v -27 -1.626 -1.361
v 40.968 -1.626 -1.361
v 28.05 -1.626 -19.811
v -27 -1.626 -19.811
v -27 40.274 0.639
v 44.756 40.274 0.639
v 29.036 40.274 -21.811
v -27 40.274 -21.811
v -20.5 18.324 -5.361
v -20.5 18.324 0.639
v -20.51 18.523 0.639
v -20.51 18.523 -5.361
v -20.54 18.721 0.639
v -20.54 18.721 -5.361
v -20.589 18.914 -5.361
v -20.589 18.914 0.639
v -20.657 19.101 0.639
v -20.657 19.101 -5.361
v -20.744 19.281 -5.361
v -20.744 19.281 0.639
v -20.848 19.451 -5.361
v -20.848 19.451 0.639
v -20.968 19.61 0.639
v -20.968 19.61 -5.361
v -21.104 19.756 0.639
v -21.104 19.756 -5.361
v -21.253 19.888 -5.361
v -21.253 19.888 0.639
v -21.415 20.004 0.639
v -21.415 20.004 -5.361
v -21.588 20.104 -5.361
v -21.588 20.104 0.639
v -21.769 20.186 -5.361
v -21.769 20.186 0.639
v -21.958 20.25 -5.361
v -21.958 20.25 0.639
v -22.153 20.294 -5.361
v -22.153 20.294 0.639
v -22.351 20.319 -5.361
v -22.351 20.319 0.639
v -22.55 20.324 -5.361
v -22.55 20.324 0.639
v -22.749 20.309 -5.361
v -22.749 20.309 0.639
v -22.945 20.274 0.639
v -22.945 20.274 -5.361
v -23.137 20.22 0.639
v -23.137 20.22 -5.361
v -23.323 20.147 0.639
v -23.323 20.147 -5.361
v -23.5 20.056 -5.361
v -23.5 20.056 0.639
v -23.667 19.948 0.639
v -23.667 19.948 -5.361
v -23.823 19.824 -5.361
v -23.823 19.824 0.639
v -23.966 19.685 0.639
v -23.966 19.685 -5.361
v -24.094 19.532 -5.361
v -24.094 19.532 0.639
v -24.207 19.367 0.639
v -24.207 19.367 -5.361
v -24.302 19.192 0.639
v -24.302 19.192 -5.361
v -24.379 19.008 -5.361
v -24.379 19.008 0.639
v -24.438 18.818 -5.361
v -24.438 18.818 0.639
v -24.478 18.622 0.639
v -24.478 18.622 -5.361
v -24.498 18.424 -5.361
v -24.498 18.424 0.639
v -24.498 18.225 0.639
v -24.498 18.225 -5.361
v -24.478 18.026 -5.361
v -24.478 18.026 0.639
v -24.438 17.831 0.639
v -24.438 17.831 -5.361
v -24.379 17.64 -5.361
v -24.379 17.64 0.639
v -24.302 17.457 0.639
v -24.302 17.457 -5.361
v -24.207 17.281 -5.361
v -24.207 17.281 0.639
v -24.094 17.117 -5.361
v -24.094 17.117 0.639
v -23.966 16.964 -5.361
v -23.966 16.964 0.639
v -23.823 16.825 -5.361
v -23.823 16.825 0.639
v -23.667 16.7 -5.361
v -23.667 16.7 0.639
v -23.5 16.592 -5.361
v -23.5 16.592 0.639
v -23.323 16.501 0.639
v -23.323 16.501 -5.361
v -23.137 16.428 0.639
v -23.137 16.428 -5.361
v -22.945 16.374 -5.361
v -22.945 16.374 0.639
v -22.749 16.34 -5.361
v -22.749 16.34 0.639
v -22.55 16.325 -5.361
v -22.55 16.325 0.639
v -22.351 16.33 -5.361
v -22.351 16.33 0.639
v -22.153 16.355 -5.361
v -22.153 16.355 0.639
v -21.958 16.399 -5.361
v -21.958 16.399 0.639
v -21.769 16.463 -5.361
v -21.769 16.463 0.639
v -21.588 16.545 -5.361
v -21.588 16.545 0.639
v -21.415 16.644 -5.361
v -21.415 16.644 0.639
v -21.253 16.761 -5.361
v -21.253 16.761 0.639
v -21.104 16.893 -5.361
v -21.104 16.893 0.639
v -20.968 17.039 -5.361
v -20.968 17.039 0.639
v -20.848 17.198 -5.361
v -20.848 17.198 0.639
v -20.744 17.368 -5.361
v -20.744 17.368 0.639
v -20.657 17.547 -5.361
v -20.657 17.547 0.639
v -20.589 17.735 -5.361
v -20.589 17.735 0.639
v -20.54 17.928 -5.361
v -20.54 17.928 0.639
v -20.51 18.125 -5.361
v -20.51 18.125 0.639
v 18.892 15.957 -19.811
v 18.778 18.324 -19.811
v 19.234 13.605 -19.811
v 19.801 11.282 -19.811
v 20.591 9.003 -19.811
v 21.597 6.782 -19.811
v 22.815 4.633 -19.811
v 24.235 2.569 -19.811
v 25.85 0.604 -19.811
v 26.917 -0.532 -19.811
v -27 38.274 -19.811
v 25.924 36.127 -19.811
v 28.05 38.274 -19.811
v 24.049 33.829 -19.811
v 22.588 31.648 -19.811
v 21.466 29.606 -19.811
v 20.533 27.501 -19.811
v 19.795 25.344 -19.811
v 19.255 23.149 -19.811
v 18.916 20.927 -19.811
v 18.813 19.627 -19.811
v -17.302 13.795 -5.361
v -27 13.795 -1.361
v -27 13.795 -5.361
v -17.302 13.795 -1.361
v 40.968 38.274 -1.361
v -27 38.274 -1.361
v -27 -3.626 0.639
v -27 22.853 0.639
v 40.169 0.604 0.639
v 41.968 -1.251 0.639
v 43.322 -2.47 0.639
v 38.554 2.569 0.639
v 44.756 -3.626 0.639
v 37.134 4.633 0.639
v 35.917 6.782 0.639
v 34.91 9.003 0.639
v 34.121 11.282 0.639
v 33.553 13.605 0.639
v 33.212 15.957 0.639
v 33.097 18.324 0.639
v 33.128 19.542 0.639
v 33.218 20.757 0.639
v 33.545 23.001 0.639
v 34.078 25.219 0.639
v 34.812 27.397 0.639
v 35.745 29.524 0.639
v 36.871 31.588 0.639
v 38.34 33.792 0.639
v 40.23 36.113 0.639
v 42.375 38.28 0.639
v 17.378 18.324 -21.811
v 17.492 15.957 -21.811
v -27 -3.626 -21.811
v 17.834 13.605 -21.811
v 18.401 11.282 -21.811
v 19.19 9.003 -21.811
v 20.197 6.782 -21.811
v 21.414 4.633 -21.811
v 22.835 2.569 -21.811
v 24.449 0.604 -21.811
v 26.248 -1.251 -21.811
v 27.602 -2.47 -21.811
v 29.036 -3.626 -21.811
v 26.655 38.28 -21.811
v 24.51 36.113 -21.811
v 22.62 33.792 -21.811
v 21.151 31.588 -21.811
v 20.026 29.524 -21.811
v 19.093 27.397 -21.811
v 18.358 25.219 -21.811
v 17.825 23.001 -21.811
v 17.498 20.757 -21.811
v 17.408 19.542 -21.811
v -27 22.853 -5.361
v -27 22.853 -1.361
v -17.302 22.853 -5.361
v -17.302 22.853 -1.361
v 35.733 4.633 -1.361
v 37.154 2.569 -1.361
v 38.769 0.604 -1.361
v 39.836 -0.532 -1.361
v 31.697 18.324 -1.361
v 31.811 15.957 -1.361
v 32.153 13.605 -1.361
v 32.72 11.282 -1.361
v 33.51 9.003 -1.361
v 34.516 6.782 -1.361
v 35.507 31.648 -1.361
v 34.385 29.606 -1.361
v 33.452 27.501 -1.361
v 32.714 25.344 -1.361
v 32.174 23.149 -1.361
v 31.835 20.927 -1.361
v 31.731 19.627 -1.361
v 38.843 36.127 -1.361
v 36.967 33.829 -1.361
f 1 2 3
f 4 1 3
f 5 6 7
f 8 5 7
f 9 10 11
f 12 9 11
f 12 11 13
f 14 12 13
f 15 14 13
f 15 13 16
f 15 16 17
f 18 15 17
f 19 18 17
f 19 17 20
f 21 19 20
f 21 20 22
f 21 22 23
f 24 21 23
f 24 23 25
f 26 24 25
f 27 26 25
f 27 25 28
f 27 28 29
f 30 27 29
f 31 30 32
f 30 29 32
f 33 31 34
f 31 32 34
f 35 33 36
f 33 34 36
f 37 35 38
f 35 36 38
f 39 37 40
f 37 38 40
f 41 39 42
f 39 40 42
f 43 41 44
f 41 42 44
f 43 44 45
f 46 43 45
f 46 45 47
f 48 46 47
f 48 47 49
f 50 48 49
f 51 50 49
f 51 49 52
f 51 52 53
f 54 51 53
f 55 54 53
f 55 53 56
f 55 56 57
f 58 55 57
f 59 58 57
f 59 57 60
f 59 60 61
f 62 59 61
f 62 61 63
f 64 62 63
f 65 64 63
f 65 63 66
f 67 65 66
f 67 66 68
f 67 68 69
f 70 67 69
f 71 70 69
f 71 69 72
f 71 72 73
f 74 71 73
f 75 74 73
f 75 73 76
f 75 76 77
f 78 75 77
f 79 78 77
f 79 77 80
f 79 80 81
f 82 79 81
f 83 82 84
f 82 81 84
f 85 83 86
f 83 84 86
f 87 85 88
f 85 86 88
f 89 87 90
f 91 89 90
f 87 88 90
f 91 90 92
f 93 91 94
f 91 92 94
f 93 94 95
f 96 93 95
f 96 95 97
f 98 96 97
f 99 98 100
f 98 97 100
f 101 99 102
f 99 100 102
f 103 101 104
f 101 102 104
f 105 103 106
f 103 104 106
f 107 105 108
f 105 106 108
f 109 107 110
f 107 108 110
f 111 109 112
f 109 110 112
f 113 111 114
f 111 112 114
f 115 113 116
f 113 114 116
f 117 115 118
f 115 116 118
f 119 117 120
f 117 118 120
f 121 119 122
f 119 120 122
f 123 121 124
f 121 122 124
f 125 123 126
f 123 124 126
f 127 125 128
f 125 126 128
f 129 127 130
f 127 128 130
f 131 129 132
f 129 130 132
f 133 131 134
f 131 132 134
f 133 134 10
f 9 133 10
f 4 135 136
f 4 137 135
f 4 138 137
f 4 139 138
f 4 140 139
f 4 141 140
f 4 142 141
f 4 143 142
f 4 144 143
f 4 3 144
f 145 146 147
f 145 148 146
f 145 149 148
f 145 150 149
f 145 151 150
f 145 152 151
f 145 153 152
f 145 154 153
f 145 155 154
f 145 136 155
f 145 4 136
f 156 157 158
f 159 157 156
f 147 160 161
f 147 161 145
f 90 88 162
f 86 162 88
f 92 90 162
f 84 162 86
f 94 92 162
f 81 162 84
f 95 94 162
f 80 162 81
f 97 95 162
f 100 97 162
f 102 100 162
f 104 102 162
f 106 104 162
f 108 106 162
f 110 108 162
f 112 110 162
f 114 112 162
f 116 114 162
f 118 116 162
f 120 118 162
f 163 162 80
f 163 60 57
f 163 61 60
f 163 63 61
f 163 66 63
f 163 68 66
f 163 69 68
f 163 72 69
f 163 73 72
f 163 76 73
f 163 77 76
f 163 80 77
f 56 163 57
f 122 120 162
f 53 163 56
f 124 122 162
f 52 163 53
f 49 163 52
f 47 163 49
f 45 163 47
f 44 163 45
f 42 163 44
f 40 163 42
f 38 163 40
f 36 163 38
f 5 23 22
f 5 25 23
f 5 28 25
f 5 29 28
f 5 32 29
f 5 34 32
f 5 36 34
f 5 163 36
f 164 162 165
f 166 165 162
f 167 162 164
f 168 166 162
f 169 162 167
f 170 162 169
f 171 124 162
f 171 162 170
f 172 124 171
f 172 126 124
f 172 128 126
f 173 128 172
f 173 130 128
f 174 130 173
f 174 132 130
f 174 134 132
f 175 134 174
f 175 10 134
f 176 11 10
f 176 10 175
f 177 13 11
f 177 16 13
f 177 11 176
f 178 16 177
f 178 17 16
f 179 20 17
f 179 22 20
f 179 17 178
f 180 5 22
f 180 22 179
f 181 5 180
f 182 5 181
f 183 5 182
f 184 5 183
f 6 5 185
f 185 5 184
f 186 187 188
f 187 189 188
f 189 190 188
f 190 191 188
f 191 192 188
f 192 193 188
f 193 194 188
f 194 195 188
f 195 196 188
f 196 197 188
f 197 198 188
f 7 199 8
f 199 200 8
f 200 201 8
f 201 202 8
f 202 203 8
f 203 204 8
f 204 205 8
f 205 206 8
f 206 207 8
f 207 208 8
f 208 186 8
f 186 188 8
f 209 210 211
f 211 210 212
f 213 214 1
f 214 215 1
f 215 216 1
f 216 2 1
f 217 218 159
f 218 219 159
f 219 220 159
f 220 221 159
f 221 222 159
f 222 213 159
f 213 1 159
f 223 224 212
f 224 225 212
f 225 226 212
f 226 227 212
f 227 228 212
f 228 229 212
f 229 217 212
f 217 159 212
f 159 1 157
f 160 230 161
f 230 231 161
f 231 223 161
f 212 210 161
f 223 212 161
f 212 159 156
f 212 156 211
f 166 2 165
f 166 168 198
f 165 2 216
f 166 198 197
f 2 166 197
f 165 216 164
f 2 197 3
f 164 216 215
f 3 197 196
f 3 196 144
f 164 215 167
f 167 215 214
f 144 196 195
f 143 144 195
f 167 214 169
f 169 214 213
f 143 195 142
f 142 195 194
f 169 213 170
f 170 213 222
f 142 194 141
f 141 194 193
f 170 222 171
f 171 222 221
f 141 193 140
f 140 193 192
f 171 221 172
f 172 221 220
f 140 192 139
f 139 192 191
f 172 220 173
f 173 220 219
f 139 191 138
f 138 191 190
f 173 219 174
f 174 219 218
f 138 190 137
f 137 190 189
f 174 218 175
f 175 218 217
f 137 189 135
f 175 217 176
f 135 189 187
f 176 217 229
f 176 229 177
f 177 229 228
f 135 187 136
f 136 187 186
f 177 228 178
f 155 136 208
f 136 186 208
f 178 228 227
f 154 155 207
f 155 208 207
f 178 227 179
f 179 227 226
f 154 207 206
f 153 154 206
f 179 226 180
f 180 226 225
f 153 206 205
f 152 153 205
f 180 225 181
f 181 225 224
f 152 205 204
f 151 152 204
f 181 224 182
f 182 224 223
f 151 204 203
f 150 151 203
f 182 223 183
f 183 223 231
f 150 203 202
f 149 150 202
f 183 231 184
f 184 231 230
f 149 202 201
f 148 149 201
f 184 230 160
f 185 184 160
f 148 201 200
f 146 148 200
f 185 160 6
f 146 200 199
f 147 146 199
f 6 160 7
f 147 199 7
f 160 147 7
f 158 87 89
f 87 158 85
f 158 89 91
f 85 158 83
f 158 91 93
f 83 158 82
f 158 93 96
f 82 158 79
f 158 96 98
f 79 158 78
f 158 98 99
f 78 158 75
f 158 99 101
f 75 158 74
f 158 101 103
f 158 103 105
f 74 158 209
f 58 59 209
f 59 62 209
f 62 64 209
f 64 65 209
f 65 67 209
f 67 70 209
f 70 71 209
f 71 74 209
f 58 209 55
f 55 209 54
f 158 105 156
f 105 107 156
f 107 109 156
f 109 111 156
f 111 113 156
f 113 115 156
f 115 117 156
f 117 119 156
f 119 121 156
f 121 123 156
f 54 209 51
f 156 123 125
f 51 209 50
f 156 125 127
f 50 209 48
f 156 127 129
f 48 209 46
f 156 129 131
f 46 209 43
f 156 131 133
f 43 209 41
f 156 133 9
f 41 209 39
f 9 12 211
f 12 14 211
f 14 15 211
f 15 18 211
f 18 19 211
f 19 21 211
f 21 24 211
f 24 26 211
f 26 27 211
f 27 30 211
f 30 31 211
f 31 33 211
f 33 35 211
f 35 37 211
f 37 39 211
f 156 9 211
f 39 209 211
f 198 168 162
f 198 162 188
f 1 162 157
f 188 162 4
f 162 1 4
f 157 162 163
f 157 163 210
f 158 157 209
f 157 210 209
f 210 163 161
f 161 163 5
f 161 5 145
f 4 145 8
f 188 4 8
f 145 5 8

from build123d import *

# Parameters (mm, degrees)
BOSS_EXTRUDE1_DEPTH      = 60
BOSS_EXTRUDE1_DEPTH_BACK = 27
SKETCH1_W                = 22.45
SKETCH1_H                = 43.9
SKETCH1_W_2              = 18.45
SKETCH1_H_2              = 39.9
SKETCH3_W                = 9.697753833
SKETCH3_H                = 9.057928037
SKETCH3_R                = 2
BOSS_EXTRUDE2_DEPTH      = 6
CUT_EXTRUDE1_REACH       = 66.258
SKETCH3_3_R              = 2


with BuildPart() as part:
    # Sketch1 → Boss-Extrude1 (new, two sides: drawn at the far end of the back side and taken through both)
    with BuildSketch(Plane(origin=(0, 0, 0), x_dir=(0, 0, -1), z_dir=(1, 0, 0)).offset(-BOSS_EXTRUDE1_DEPTH_BACK)):
        with Locations((10.58634259, 18.324330998)):
            Rectangle(SKETCH1_W, SKETCH1_H)
        with Locations((10.58634259, 18.324330998)):
            Rectangle(SKETCH1_W_2, SKETCH1_H_2, mode=Mode.SUBTRACT)
    extrude(amount=BOSS_EXTRUDE1_DEPTH + BOSS_EXTRUDE1_DEPTH_BACK)

    # Sketch2 → Cut-Revolve1 (revolve, cut)
    with BuildSketch(Plane(origin=(0, 18.324330998, 0), x_dir=(-1, 0, 0), z_dir=(0, -1, 0))):
        Polygon((-79.85393198, -15.110595304), (-55.279370652, -32.317888394), (-13.19002891, 27.791921119), (-37.764590239, 44.999214209), align=None)
    revolve(axis=Axis((79.85393198, 18.324330998, 15.110595304), (-0.573576436351041, 0, -0.8191520442889954)), mode=Mode.SUBTRACT)

    # Sketch3 → Boss-Extrude2 (add)
    with BuildSketch(Plane.XY.offset(0.63865741)):
        with Locations((-22.151123083, 18.324330997)):
            Rectangle(SKETCH3_W, SKETCH3_H)
        with Locations((-22.5, 18.324330998)):
            Circle(SKETCH3_R, mode=Mode.SUBTRACT)
    extrude(amount=-BOSS_EXTRUDE2_DEPTH)

    # Sketch3<3> → Cut-Extrude1 (cut, up to next)
    with BuildSketch(Plane.XY.offset(0.63865741), mode=Mode.PRIVATE) as cut_extrude1_sk1:
        with Locations((-22.5, 18.324330998)):
            Circle(SKETCH3_3_R)
    cut_extrude1_tool1 = extrude(cut_extrude1_sk1.sketch, amount=-CUT_EXTRUDE1_REACH, mode=Mode.PRIVATE) & part.part
    add(cut_extrude1_tool1.solids().sort_by_distance((-22.5, 18.324331, 0.638657))[0], mode=Mode.SUBTRACT)


solid = part.part
